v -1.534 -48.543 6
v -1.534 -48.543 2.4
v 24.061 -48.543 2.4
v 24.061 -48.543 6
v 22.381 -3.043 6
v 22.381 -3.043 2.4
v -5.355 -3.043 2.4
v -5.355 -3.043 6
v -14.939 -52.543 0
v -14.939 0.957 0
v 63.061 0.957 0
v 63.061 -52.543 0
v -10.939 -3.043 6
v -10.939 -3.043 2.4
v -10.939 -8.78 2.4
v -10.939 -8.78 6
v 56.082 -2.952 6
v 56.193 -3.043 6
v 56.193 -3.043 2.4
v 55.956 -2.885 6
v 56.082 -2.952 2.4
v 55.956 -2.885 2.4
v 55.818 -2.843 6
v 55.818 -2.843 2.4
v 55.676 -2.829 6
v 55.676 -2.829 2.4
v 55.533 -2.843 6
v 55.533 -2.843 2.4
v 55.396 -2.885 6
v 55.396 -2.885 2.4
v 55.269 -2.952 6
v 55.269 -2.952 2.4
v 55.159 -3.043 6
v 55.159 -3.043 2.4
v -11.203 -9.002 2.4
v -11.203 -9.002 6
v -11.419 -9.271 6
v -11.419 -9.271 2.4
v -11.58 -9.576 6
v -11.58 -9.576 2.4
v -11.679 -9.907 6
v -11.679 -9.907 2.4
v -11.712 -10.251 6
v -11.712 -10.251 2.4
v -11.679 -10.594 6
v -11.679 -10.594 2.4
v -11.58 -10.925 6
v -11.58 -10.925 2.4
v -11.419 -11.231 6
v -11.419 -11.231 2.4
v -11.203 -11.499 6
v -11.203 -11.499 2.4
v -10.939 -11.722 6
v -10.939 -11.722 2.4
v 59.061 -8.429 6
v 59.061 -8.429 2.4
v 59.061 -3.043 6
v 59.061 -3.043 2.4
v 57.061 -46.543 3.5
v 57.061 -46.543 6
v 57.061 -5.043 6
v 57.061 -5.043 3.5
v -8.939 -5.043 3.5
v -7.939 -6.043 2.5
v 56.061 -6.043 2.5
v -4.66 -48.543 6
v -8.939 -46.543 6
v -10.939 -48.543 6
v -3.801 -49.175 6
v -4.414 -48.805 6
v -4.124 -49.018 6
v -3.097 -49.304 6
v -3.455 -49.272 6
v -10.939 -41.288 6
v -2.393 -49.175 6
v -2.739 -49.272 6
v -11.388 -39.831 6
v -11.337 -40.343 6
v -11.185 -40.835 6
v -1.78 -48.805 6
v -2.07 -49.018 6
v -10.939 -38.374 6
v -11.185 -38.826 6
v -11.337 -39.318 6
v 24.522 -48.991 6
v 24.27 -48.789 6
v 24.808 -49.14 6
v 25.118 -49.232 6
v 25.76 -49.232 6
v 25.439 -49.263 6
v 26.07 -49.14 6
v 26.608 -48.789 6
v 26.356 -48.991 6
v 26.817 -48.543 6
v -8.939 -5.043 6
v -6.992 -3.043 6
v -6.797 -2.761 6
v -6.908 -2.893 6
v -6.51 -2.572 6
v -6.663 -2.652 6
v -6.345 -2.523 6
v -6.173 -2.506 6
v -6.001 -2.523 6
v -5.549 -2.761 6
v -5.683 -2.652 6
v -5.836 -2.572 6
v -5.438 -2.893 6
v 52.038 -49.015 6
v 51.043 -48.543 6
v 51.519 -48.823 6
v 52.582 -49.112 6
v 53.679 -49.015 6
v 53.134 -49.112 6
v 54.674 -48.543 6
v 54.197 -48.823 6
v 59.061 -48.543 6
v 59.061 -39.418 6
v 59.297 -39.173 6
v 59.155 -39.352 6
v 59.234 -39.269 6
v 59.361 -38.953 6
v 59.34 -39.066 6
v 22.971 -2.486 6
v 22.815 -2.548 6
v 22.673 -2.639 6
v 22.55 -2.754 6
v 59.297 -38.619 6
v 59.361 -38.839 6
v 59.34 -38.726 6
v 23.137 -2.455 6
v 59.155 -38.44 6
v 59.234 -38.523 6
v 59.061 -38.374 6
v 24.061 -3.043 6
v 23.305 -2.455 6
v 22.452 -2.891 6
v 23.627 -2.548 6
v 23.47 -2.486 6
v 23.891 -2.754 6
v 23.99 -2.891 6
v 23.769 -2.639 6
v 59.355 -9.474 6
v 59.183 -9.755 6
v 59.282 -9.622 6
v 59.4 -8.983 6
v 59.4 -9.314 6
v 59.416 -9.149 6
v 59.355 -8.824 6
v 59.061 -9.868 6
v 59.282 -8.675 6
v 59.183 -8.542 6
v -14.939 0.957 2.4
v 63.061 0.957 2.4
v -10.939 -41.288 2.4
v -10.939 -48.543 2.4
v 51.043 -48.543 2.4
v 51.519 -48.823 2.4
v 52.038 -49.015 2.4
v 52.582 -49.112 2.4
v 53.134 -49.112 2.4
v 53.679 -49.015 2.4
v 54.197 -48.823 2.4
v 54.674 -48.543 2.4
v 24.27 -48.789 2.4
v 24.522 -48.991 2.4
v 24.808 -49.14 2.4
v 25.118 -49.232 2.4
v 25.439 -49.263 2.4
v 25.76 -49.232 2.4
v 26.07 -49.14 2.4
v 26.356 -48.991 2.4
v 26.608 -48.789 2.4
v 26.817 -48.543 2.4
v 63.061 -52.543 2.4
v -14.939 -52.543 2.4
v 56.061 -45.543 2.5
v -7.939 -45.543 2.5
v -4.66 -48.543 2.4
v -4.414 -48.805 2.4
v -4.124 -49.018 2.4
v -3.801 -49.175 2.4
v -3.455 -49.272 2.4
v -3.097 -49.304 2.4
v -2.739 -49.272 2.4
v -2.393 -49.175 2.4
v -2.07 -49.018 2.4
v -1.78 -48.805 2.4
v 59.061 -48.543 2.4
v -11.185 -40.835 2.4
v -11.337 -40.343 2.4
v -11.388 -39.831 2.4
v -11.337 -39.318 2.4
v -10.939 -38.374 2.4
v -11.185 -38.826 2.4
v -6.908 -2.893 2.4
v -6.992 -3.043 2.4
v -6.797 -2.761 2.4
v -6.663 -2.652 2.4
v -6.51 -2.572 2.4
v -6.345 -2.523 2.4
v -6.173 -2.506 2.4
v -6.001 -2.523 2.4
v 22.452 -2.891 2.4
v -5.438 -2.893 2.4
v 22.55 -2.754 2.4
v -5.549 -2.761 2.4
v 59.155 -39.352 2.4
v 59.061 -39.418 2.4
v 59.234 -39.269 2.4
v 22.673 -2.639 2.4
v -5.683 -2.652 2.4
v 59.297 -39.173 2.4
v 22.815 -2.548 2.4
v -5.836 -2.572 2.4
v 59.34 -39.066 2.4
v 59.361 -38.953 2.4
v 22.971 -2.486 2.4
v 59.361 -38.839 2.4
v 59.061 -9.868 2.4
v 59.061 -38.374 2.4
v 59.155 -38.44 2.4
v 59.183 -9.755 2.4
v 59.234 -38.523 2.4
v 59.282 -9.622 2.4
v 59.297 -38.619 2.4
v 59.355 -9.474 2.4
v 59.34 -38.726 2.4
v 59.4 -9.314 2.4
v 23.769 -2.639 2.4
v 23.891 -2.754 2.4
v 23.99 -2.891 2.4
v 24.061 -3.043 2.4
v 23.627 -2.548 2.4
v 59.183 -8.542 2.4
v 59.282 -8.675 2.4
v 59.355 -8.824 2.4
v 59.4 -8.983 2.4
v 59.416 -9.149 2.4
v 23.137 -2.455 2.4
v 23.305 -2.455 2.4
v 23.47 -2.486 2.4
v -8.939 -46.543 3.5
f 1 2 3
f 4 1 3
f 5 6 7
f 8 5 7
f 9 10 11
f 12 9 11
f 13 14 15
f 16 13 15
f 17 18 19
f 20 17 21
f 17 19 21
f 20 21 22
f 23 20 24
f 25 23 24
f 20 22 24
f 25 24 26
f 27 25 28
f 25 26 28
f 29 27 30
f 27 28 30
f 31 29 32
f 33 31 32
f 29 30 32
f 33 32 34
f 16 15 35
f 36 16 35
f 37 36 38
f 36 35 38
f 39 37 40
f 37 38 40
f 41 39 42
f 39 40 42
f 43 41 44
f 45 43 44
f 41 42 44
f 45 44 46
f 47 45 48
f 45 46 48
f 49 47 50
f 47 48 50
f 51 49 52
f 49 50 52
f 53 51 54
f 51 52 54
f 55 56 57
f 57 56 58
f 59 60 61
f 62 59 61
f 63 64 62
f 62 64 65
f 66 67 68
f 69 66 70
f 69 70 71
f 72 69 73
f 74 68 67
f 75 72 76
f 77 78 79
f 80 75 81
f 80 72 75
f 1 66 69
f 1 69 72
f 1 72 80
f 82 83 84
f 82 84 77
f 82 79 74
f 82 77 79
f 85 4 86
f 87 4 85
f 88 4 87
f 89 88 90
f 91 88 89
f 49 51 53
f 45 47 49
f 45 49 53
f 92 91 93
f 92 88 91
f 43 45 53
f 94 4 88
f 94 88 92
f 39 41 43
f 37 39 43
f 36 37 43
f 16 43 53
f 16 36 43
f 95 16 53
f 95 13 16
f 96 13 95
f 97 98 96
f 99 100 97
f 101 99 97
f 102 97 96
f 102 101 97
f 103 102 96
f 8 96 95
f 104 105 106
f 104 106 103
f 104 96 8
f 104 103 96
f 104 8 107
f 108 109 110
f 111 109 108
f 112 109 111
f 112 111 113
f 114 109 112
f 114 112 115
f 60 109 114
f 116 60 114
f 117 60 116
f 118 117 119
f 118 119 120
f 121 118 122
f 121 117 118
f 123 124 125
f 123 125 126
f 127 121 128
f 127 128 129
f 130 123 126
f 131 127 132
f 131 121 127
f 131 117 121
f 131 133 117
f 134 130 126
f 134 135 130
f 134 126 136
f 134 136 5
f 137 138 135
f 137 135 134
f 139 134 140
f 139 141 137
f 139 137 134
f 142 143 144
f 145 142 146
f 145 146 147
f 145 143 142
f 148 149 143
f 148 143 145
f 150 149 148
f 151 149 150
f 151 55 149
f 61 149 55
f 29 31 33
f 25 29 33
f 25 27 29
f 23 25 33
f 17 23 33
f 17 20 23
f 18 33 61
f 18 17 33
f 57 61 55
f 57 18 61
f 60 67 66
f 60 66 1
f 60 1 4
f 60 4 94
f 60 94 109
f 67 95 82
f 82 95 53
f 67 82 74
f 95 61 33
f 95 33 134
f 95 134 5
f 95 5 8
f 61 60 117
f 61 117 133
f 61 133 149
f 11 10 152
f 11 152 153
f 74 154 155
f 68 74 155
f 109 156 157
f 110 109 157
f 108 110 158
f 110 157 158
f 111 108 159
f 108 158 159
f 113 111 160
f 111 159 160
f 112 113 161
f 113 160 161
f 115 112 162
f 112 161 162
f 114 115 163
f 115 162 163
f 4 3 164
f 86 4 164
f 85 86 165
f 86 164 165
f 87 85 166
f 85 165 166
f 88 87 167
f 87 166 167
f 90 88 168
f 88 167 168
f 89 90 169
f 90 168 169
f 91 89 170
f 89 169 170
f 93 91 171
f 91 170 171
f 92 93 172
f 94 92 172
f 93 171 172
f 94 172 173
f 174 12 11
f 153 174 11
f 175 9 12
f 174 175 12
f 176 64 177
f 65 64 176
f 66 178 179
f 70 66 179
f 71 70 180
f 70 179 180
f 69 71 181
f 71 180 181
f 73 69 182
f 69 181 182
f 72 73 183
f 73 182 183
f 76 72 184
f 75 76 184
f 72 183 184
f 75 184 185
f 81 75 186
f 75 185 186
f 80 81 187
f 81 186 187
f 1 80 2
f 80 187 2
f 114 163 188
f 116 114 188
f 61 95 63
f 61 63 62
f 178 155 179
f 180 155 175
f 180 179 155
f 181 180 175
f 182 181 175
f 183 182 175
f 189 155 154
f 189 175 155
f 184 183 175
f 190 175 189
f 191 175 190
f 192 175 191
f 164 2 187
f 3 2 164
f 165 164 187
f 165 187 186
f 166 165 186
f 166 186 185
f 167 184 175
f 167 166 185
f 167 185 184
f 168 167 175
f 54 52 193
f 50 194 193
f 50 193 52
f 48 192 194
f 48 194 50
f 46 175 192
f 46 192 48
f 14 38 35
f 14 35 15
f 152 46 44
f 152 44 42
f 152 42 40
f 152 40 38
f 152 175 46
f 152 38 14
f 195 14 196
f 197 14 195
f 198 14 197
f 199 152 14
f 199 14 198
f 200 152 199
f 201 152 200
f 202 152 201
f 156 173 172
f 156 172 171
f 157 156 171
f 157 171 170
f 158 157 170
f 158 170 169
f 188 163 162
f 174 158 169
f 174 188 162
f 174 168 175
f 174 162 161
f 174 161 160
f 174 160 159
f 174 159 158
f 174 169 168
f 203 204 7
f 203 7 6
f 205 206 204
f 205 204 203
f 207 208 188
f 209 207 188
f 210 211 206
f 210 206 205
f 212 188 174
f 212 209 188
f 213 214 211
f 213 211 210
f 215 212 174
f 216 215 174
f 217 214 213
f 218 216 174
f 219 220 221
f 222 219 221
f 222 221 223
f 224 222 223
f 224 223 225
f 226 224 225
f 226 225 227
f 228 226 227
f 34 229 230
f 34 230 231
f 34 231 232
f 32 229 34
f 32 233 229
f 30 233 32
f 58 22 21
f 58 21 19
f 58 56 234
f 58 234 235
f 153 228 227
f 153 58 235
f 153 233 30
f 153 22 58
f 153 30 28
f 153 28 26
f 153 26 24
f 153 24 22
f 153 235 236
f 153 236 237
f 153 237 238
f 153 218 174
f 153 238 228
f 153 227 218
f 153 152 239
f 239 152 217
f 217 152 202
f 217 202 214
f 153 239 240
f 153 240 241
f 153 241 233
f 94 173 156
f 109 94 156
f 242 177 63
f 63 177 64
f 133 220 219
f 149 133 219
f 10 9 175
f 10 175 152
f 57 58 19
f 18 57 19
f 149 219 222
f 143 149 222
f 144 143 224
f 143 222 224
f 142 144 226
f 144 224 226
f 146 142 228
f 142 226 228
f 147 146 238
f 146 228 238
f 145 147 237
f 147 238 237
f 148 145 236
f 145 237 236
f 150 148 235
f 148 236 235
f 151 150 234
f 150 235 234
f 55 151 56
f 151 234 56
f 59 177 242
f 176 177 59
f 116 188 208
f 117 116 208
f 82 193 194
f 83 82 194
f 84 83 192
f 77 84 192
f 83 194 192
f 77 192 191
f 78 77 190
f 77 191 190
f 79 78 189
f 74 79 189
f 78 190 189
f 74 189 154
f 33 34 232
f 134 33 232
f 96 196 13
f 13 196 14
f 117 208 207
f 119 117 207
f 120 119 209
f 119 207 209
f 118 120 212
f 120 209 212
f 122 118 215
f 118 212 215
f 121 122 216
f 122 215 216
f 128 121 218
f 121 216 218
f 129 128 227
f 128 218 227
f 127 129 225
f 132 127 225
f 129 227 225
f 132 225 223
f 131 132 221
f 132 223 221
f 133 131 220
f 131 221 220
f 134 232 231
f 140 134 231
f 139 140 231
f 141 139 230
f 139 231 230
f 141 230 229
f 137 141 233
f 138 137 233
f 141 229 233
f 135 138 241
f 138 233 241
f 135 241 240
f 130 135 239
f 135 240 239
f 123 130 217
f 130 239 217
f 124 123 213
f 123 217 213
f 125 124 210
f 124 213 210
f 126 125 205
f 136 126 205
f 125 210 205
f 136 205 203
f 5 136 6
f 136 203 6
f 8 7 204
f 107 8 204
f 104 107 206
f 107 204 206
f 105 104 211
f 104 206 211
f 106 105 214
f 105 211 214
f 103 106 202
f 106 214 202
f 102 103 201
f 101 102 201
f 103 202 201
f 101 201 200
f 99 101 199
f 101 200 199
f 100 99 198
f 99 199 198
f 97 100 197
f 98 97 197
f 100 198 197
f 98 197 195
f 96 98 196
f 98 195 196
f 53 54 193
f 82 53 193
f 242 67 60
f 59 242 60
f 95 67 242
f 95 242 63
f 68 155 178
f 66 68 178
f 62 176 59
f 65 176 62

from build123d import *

# Parameters (mm, degrees)
F0_W     = 78
F0_H     = 53.5
F1_DEPTH = 2.4
F2_DEPTH = 6
F3_W     = 66
F3_H     = 41.5
F4_DEPTH = 3.5
F5_SIZE  = 1


with BuildPart() as f1:
    # F0 (on Top) → F1 (new body)
    with BuildSketch(Plane.XY):
        with Locations((24.061151, -25.793475)):
            Rectangle(F0_W, F0_H)
        with BuildLine():
            Line((-10.938849, -8.77954), (-10.938849, -3.043475))
            Line((-10.938849, -3.043475), (-6.991661, -3.043475))
            ThreePointArc((-6.991661, -3.043475), (-6.173105, -2.505917), (-5.354548, -3.043475))
            Line((-5.354548, -3.043475), (22.380689, -3.043475))
            ThreePointArc((22.380689, -3.043475), (23.22092, -2.450647), (24.061151, -3.043475))
            Line((24.061151, -3.043475), (55.158719, -3.043475))
            ThreePointArc((55.158719, -3.043475), (55.675749, -2.828865), (56.192778, -3.043475))
            Line((56.192778, -3.043475), (59.061151, -3.043475))
            Line((59.061151, -3.043475), (59.061151, -8.429402))
            ThreePointArc((59.061151, -8.429402), (59.415671, -9.148699), (59.061151, -9.867996))
            Line((59.061151, -9.867996), (59.061151, -38.373694))
            ThreePointArc((59.061151, -38.373694), (59.364159, -38.895946), (59.061151, -39.418198))
            Line((59.061151, -39.418198), (59.061151, -48.543475))
            Line((59.061151, -48.543475), (54.673515, -48.543475))
            ThreePointArc((54.673515, -48.543475), (52.858135, -49.124567), (51.042754, -48.543475))
            Line((51.042754, -48.543475), (26.816798, -48.543475))
            ThreePointArc((26.816798, -48.543475), (25.438975, -49.262858), (24.061151, -48.543475))
            Line((24.061151, -48.543475), (-1.533683, -48.543475))
            ThreePointArc((-1.533683, -48.543475), (-3.096999, -49.304078), (-4.660315, -48.543475))
            Line((-4.660315, -48.543475), (-10.938849, -48.543475))
            Line((-10.938849, -48.543475), (-10.938849, -41.287743))
            ThreePointArc((-10.938849, -41.287743), (-11.387766, -39.830718), (-10.938849, -38.373694))
            Line((-10.938849, -38.373694), (-10.938849, -11.72171))
            ThreePointArc((-10.938849, -11.72171), (-11.712319, -10.250625), (-10.938849, -8.77954))
        make_face(mode=Mode.SUBTRACT)
    extrude(amount=F1_DEPTH)

    # F0 (on Top) → F2 (join)
    with BuildSketch(Plane.XY):
        with BuildLine():
            Line((-6.991661, -3.043475), (-10.938849, -3.043475))
            Line((-10.938849, -3.043475), (-10.938849, -8.77954))
            ThreePointArc((-10.938849, -8.77954), (-11.712319, -10.250625), (-10.938849, -11.72171))
            Line((-10.938849, -11.72171), (-10.938849, -38.373694))
            ThreePointArc((-10.938849, -38.373694), (-11.387766, -39.830718), (-10.938849, -41.287743))
            Line((-10.938849, -41.287743), (-10.938849, -48.543475))
            Line((-10.938849, -48.543475), (-4.660315, -48.543475))
            ThreePointArc((-4.660315, -48.543475), (-3.096999, -49.304078), (-1.533683, -48.543475))
            Line((-1.533683, -48.543475), (24.061151, -48.543475))
            ThreePointArc((24.061151, -48.543475), (25.438975, -49.262858), (26.816798, -48.543475))
            Line((26.816798, -48.543475), (51.042754, -48.543475))
            ThreePointArc((51.042754, -48.543475), (52.858135, -49.124567), (54.673515, -48.543475))
            Line((54.673515, -48.543475), (59.061151, -48.543475))
            Line((59.061151, -48.543475), (59.061151, -39.418198))
            ThreePointArc((59.061151, -39.418198), (59.364159, -38.895946), (59.061151, -38.373694))
            Line((59.061151, -38.373694), (59.061151, -9.867996))
            ThreePointArc((59.061151, -9.867996), (59.415671, -9.148699), (59.061151, -8.429402))
            Line((59.061151, -8.429402), (59.061151, -3.043475))
            Line((59.061151, -3.043475), (56.192778, -3.043475))
            ThreePointArc((56.192778, -3.043475), (55.675749, -2.828865), (55.158719, -3.043475))
            Line((55.158719, -3.043475), (24.061151, -3.043475))
            ThreePointArc((24.061151, -3.043475), (23.22092, -2.450647), (22.380689, -3.043475))
            Line((22.380689, -3.043475), (-5.354548, -3.043475))
            ThreePointArc((-5.354548, -3.043475), (-6.173105, -2.505917), (-6.991661, -3.043475))
        make_face()
    extrude(amount=F2_DEPTH)

    # F3 (on face) → F4 (cut)
    with BuildSketch(Plane.XY.offset(6)):
        with Locations((24.061151, -25.793475)):
            Rectangle(F3_W, F3_H)
    extrude(amount=-F4_DEPTH, mode=Mode.SUBTRACT)

    # F5
    f5_edges = [f1.edges().sort_by_distance(p)[0] for p in [
        (-8.938849, -25.793475, 2.5),
        (24.061151, -5.043475, 2.5),
        (57.061151, -25.793475, 2.5),
        (24.061151, -46.543475, 2.5),
    ]]
    chamfer(f5_edges, length=F5_SIZE)


solid = f1.part
